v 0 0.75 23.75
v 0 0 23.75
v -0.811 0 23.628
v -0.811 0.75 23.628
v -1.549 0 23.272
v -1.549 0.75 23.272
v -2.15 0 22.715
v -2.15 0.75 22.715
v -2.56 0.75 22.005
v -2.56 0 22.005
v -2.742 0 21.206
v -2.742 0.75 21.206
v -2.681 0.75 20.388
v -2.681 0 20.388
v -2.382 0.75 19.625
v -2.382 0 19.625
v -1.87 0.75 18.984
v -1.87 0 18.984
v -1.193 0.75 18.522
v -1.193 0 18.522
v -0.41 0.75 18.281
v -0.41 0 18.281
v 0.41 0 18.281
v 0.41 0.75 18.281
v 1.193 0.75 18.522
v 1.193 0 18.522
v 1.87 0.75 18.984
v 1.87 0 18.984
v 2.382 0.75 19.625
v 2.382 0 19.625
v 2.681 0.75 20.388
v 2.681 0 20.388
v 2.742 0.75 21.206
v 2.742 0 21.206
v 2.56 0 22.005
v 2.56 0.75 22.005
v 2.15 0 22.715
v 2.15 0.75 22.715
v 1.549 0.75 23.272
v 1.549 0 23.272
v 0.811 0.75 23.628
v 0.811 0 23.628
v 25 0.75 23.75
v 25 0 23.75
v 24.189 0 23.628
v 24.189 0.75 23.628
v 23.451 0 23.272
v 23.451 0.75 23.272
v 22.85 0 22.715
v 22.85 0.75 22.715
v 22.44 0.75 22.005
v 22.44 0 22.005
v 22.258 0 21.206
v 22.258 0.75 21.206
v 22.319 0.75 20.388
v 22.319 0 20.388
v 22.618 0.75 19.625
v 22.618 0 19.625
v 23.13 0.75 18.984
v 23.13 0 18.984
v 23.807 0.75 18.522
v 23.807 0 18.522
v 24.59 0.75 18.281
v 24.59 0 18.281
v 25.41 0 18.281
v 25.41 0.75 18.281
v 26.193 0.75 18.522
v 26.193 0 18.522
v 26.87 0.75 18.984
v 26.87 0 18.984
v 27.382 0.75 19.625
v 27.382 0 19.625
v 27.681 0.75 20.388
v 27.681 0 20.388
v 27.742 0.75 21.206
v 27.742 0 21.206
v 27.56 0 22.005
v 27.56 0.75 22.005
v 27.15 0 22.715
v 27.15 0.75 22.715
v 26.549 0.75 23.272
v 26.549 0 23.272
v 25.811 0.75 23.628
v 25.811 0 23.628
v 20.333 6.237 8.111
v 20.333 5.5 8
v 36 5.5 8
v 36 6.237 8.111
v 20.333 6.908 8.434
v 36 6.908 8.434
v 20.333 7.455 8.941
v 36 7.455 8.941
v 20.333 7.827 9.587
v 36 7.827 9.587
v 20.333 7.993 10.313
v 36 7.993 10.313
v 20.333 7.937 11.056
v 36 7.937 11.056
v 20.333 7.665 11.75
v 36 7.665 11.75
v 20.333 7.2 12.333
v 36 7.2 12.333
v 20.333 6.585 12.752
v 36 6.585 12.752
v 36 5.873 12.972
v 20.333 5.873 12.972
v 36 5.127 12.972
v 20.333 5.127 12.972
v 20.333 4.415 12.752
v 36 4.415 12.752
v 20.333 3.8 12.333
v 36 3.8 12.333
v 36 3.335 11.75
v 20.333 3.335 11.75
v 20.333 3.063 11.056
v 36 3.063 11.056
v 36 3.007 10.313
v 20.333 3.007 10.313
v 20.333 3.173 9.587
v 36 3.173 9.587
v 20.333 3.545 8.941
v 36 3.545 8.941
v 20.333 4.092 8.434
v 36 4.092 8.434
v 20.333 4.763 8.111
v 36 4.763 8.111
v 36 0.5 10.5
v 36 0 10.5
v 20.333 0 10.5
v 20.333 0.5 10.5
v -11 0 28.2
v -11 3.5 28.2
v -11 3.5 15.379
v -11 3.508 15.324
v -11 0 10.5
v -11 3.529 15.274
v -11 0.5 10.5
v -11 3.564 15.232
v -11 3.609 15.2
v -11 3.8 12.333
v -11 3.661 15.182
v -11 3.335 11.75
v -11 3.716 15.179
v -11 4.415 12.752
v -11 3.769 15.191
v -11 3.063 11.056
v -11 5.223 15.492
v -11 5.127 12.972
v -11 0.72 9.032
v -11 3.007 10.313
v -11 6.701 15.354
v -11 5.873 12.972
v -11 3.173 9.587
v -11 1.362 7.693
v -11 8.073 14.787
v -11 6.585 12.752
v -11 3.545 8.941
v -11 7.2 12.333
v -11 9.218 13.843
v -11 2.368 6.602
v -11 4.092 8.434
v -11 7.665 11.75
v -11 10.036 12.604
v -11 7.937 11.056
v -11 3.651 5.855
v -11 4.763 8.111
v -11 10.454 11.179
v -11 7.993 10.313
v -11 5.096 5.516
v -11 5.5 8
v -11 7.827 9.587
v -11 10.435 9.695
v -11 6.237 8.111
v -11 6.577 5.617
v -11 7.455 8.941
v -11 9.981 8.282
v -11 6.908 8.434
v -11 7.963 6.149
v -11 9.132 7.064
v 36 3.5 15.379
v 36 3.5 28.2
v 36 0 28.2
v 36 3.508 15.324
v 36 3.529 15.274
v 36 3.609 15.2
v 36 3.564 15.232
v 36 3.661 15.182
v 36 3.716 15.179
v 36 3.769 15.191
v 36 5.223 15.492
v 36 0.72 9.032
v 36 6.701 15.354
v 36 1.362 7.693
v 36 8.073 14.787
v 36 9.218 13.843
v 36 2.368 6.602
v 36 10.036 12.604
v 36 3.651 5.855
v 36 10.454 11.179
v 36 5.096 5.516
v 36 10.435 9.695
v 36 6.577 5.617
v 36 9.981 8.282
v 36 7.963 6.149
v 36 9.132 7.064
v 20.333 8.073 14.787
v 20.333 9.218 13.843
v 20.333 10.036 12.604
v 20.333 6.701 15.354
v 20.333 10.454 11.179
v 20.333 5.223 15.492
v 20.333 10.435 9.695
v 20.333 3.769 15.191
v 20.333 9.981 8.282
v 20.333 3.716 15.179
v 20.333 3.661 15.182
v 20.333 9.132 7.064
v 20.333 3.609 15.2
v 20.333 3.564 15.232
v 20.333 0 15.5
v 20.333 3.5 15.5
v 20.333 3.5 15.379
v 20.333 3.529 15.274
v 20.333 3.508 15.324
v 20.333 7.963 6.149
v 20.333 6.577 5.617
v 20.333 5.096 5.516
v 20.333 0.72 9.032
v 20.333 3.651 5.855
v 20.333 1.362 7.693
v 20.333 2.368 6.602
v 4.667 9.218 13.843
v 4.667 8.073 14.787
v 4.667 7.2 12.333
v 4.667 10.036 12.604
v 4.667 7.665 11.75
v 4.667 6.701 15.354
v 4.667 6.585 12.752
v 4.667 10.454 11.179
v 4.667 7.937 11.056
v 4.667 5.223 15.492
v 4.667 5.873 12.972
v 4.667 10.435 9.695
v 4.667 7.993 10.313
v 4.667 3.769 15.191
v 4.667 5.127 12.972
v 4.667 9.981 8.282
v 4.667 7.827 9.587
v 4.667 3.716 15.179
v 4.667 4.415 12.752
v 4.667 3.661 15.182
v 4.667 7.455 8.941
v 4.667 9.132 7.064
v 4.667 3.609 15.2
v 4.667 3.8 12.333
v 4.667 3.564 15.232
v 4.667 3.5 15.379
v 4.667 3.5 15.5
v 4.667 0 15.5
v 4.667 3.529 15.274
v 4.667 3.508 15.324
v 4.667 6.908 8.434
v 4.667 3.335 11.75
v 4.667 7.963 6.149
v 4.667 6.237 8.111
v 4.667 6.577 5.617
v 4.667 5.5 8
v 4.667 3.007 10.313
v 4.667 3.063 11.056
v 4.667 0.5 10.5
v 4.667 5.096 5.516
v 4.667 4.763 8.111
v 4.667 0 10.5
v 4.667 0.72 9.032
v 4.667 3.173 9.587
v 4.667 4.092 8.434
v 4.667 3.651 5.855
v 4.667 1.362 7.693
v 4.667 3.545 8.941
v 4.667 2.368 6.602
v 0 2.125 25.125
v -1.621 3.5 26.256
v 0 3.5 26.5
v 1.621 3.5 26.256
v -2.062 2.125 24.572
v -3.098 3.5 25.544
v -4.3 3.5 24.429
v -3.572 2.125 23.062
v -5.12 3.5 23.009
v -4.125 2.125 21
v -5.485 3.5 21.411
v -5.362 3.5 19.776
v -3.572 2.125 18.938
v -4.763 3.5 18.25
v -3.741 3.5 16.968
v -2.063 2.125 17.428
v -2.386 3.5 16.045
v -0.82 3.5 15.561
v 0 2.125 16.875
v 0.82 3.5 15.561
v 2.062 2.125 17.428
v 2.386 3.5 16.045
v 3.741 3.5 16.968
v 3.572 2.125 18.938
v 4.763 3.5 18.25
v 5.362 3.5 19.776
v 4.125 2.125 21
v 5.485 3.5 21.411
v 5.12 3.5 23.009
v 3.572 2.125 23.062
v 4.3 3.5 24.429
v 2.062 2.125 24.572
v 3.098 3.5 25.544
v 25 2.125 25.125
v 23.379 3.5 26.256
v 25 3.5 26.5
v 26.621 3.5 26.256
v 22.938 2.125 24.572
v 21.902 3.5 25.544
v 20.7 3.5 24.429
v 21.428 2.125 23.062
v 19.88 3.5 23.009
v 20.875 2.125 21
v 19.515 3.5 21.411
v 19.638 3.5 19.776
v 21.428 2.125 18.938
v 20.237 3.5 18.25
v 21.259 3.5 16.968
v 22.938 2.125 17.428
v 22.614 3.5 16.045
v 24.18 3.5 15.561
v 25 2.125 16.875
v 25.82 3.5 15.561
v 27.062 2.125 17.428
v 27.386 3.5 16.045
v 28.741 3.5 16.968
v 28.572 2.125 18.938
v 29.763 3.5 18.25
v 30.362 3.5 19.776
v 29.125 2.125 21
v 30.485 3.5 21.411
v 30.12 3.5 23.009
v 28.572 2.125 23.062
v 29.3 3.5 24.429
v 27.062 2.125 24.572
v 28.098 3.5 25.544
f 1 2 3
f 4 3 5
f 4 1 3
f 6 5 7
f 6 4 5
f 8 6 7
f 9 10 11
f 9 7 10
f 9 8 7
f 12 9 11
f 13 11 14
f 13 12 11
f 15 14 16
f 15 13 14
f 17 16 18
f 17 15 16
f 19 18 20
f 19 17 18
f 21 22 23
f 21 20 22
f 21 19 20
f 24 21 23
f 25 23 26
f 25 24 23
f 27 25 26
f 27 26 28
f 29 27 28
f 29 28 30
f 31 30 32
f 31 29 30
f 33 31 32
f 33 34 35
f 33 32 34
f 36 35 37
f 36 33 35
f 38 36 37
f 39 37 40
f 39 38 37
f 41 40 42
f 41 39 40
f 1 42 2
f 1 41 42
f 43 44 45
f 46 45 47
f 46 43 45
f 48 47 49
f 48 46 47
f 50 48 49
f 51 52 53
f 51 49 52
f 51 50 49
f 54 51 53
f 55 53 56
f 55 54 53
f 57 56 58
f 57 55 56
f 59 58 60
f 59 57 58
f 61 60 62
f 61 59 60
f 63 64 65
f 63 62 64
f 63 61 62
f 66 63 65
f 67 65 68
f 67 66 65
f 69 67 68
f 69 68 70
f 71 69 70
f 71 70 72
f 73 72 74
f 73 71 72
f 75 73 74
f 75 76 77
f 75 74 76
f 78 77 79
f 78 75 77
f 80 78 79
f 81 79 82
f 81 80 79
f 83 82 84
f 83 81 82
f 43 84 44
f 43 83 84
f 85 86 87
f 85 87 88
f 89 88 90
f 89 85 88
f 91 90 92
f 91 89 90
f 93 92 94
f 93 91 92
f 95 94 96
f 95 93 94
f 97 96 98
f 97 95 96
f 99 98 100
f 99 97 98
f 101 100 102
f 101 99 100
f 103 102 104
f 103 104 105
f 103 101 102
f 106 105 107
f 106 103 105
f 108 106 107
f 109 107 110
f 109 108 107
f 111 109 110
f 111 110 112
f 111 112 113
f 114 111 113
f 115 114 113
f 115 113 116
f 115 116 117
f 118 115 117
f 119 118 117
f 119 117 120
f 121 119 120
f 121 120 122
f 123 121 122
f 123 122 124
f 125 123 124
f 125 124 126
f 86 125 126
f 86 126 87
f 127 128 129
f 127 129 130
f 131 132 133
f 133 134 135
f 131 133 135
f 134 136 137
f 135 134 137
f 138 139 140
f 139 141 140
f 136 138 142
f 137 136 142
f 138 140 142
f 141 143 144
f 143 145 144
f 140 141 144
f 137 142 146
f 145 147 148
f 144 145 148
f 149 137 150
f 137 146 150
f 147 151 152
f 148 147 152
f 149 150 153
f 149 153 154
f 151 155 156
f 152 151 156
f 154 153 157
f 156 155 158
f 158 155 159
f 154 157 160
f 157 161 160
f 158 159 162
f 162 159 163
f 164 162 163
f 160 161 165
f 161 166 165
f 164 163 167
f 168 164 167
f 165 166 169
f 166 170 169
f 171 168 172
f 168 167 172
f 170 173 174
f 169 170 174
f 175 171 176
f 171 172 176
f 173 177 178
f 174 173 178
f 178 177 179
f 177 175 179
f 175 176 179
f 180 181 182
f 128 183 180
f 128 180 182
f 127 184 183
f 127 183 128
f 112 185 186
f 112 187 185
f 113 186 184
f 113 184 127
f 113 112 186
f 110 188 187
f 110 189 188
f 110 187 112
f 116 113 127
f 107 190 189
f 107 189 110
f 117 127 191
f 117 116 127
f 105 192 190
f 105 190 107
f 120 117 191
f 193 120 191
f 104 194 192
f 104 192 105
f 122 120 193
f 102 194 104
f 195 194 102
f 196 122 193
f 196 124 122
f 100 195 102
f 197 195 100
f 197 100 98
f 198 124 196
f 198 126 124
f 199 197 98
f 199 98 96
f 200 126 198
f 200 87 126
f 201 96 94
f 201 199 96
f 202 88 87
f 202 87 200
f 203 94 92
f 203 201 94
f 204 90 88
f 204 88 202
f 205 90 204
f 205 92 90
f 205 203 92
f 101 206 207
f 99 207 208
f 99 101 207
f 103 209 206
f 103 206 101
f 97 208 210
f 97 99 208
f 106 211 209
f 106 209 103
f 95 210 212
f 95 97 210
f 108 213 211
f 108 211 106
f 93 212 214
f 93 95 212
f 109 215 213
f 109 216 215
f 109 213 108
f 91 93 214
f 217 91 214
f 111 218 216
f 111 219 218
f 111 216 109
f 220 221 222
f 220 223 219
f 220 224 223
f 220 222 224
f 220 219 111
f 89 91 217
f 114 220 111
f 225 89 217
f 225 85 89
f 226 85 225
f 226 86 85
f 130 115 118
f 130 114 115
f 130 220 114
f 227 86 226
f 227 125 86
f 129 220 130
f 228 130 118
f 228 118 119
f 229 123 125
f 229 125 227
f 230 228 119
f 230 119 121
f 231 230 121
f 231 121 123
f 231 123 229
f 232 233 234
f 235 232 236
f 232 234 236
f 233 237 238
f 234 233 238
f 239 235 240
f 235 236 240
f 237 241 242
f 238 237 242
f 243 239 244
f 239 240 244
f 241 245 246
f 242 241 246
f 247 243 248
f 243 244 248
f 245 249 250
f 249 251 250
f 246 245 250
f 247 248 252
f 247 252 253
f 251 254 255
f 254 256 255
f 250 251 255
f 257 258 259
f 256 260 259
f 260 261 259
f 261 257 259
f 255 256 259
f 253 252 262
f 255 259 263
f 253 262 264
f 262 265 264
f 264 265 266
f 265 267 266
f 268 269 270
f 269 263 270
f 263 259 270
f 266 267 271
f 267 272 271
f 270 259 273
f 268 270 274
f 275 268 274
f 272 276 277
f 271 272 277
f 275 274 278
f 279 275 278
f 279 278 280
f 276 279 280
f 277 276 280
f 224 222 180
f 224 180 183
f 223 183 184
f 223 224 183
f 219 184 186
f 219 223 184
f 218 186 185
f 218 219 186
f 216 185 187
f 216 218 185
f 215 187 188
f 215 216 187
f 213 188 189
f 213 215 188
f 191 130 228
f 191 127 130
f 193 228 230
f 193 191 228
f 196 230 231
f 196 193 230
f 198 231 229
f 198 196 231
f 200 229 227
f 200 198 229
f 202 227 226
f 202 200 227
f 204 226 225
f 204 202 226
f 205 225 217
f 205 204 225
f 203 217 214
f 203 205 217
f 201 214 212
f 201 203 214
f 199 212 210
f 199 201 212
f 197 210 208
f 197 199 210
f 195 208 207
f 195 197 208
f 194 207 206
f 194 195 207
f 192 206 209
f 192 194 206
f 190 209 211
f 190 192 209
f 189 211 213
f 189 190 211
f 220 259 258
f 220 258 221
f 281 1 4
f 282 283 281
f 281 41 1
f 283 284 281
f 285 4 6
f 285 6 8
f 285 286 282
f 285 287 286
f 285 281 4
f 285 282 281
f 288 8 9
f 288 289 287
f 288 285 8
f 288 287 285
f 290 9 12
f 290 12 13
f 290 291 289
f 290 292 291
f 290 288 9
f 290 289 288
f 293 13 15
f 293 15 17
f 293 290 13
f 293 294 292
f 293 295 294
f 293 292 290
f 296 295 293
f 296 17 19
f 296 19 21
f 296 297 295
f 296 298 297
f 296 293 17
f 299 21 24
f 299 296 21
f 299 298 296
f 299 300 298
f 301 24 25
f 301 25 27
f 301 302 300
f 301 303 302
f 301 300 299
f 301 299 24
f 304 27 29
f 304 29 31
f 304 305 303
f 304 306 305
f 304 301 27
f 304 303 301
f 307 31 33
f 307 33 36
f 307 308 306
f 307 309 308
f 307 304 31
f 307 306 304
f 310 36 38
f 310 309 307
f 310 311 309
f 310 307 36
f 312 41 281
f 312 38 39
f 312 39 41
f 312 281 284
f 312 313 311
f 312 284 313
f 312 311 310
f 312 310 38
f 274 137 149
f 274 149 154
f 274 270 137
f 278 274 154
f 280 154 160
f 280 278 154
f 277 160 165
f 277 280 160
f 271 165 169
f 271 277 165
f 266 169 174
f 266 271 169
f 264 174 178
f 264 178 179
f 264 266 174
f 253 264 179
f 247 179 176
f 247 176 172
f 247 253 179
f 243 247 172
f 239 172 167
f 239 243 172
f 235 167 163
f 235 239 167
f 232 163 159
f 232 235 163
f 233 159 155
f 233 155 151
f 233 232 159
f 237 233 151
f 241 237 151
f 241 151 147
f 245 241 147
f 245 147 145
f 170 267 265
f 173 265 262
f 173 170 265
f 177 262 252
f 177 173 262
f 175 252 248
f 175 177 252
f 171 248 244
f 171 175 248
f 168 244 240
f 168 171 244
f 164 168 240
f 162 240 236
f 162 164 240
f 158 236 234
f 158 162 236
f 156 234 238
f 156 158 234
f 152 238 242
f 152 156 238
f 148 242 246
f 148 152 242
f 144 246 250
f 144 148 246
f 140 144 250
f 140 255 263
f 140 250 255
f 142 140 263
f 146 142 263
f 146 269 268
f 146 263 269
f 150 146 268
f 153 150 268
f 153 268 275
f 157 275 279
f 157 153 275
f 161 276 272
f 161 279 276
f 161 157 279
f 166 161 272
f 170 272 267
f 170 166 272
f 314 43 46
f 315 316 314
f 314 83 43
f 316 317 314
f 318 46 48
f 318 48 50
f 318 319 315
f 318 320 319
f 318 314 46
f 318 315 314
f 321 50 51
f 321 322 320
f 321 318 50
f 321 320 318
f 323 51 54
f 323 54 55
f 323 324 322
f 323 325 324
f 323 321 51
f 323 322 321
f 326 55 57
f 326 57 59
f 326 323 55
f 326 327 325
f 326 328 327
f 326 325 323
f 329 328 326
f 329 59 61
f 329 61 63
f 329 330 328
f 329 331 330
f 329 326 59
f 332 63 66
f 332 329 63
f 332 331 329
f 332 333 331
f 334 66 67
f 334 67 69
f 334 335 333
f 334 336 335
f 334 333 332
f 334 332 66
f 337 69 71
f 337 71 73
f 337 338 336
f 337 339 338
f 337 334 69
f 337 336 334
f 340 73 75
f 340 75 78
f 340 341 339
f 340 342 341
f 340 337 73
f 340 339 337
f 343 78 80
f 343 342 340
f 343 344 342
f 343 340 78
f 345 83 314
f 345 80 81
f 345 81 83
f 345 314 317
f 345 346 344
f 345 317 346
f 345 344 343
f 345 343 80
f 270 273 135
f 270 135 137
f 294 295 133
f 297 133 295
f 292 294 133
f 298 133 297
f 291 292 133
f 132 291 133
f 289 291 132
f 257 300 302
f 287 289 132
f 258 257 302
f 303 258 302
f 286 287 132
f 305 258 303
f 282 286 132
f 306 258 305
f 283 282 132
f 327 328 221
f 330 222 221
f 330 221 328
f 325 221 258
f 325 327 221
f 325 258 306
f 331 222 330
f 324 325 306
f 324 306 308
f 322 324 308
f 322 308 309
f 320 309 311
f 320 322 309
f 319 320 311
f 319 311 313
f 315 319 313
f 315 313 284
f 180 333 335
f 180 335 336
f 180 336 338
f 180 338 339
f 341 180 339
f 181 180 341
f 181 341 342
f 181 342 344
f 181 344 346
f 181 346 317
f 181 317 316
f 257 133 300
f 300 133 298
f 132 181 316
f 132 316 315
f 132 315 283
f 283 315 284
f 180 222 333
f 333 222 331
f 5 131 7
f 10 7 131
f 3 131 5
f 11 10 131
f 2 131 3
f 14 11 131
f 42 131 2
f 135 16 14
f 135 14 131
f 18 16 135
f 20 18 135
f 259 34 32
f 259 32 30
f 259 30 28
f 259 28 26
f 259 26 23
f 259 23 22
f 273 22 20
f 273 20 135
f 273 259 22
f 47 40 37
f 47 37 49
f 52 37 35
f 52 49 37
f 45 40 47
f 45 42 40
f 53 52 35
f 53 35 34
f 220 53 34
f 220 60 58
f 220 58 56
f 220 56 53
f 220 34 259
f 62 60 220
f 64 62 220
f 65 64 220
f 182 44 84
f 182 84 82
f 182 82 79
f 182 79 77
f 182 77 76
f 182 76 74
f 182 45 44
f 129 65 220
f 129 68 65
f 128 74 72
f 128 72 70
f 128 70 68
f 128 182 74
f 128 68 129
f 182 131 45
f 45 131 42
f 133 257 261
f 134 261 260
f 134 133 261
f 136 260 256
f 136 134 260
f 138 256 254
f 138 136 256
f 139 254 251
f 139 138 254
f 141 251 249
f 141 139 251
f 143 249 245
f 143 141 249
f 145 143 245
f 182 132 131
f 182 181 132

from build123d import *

# Parameters (mm, degrees)
SKETCH1_R                = 2.5
BOSS_EXTRUDE1_DEPTH      = 36
BOSS_EXTRUDE1_DEPTH_BACK = 11
FILLET1_R                = 0.2
SKETCH2_W                = 15.666666666
SKETCH2_H                = 10
SKETCH2_W_2              = 15.666666667
CUT_EXTRUDE1_DEPTH       = 11.5
CSK1_AT_2_COUNT          = 2
CSK1_AT_2_PITCH          = 25


with BuildPart() as part:
    # Sketch1 → Boss-Extrude1 (new body, two sides)
    with BuildSketch(Plane(origin=(0, 0, 0), x_dir=(0, 0, -1), z_dir=(1, 0, 0))) as boss_extrude1_sk:
        with BuildLine():
            Line((-28.2, 0), (-10.5, 0))
            Line((-10.5, 0), (-10.5, 0.5))
            ThreePointArc((-10.5, 0.5), (-7.761387212, 9.683300133), (-15.082575695, 3.5))
            Line((-15.082575695, 3.5), (-28.2, 3.5))
            Line((-28.2, 3.5), (-28.2, 0))
        make_face()
        with Locations((-10.5, 5.5)):
            Circle(SKETCH1_R, mode=Mode.SUBTRACT)
    extrude(amount=BOSS_EXTRUDE1_DEPTH)
    extrude(boss_extrude1_sk.sketch, amount=-BOSS_EXTRUDE1_DEPTH_BACK)

    # Fillet1
    fillet1_edges = [part.edges().sort_by_distance(p)[0] for p in [
        (12.5, 3.5, 15.082575695),
    ]]
    fillet(fillet1_edges, radius=FILLET1_R)

    # Sketch2 → Cut-Extrude1 (cut, through all)
    with BuildSketch(Plane(origin=(0, 0, 0), x_dir=(1, 0, 0), z_dir=(0, 1, 0))):
        with Locations((12.5, -10.5)):
            Rectangle(SKETCH2_W, SKETCH2_H)
        with Locations((43.833333334, -10.5)):
            Rectangle(SKETCH2_W_2, SKETCH2_H)
    extrude(amount=CUT_EXTRUDE1_DEPTH, mode=Mode.SUBTRACT)

    # Sketch3 → CSK1 (revolve, cut)
    with BuildSketch(Plane(origin=(0, 3.5, 21), x_dir=(0, 0, 1), z_dir=(1, 0, 0))):
        Polygon((0, 0), (0, 3.50005), (2.75, 3.50005), (2.75, 2.75), (5.5, 0), align=None)
    csk1 = revolve(axis=Axis((0, 9.85, 21), (0, -1, 0)), mode=Mode.SUBTRACT)

    # CSK1 at 2: CSK1 ×2
    with Locations(*[(i * CSK1_AT_2_PITCH, 0, 0) for i in range(1, CSK1_AT_2_COUNT)]):
        add(csk1, mode=Mode.SUBTRACT)


solid = part.part
